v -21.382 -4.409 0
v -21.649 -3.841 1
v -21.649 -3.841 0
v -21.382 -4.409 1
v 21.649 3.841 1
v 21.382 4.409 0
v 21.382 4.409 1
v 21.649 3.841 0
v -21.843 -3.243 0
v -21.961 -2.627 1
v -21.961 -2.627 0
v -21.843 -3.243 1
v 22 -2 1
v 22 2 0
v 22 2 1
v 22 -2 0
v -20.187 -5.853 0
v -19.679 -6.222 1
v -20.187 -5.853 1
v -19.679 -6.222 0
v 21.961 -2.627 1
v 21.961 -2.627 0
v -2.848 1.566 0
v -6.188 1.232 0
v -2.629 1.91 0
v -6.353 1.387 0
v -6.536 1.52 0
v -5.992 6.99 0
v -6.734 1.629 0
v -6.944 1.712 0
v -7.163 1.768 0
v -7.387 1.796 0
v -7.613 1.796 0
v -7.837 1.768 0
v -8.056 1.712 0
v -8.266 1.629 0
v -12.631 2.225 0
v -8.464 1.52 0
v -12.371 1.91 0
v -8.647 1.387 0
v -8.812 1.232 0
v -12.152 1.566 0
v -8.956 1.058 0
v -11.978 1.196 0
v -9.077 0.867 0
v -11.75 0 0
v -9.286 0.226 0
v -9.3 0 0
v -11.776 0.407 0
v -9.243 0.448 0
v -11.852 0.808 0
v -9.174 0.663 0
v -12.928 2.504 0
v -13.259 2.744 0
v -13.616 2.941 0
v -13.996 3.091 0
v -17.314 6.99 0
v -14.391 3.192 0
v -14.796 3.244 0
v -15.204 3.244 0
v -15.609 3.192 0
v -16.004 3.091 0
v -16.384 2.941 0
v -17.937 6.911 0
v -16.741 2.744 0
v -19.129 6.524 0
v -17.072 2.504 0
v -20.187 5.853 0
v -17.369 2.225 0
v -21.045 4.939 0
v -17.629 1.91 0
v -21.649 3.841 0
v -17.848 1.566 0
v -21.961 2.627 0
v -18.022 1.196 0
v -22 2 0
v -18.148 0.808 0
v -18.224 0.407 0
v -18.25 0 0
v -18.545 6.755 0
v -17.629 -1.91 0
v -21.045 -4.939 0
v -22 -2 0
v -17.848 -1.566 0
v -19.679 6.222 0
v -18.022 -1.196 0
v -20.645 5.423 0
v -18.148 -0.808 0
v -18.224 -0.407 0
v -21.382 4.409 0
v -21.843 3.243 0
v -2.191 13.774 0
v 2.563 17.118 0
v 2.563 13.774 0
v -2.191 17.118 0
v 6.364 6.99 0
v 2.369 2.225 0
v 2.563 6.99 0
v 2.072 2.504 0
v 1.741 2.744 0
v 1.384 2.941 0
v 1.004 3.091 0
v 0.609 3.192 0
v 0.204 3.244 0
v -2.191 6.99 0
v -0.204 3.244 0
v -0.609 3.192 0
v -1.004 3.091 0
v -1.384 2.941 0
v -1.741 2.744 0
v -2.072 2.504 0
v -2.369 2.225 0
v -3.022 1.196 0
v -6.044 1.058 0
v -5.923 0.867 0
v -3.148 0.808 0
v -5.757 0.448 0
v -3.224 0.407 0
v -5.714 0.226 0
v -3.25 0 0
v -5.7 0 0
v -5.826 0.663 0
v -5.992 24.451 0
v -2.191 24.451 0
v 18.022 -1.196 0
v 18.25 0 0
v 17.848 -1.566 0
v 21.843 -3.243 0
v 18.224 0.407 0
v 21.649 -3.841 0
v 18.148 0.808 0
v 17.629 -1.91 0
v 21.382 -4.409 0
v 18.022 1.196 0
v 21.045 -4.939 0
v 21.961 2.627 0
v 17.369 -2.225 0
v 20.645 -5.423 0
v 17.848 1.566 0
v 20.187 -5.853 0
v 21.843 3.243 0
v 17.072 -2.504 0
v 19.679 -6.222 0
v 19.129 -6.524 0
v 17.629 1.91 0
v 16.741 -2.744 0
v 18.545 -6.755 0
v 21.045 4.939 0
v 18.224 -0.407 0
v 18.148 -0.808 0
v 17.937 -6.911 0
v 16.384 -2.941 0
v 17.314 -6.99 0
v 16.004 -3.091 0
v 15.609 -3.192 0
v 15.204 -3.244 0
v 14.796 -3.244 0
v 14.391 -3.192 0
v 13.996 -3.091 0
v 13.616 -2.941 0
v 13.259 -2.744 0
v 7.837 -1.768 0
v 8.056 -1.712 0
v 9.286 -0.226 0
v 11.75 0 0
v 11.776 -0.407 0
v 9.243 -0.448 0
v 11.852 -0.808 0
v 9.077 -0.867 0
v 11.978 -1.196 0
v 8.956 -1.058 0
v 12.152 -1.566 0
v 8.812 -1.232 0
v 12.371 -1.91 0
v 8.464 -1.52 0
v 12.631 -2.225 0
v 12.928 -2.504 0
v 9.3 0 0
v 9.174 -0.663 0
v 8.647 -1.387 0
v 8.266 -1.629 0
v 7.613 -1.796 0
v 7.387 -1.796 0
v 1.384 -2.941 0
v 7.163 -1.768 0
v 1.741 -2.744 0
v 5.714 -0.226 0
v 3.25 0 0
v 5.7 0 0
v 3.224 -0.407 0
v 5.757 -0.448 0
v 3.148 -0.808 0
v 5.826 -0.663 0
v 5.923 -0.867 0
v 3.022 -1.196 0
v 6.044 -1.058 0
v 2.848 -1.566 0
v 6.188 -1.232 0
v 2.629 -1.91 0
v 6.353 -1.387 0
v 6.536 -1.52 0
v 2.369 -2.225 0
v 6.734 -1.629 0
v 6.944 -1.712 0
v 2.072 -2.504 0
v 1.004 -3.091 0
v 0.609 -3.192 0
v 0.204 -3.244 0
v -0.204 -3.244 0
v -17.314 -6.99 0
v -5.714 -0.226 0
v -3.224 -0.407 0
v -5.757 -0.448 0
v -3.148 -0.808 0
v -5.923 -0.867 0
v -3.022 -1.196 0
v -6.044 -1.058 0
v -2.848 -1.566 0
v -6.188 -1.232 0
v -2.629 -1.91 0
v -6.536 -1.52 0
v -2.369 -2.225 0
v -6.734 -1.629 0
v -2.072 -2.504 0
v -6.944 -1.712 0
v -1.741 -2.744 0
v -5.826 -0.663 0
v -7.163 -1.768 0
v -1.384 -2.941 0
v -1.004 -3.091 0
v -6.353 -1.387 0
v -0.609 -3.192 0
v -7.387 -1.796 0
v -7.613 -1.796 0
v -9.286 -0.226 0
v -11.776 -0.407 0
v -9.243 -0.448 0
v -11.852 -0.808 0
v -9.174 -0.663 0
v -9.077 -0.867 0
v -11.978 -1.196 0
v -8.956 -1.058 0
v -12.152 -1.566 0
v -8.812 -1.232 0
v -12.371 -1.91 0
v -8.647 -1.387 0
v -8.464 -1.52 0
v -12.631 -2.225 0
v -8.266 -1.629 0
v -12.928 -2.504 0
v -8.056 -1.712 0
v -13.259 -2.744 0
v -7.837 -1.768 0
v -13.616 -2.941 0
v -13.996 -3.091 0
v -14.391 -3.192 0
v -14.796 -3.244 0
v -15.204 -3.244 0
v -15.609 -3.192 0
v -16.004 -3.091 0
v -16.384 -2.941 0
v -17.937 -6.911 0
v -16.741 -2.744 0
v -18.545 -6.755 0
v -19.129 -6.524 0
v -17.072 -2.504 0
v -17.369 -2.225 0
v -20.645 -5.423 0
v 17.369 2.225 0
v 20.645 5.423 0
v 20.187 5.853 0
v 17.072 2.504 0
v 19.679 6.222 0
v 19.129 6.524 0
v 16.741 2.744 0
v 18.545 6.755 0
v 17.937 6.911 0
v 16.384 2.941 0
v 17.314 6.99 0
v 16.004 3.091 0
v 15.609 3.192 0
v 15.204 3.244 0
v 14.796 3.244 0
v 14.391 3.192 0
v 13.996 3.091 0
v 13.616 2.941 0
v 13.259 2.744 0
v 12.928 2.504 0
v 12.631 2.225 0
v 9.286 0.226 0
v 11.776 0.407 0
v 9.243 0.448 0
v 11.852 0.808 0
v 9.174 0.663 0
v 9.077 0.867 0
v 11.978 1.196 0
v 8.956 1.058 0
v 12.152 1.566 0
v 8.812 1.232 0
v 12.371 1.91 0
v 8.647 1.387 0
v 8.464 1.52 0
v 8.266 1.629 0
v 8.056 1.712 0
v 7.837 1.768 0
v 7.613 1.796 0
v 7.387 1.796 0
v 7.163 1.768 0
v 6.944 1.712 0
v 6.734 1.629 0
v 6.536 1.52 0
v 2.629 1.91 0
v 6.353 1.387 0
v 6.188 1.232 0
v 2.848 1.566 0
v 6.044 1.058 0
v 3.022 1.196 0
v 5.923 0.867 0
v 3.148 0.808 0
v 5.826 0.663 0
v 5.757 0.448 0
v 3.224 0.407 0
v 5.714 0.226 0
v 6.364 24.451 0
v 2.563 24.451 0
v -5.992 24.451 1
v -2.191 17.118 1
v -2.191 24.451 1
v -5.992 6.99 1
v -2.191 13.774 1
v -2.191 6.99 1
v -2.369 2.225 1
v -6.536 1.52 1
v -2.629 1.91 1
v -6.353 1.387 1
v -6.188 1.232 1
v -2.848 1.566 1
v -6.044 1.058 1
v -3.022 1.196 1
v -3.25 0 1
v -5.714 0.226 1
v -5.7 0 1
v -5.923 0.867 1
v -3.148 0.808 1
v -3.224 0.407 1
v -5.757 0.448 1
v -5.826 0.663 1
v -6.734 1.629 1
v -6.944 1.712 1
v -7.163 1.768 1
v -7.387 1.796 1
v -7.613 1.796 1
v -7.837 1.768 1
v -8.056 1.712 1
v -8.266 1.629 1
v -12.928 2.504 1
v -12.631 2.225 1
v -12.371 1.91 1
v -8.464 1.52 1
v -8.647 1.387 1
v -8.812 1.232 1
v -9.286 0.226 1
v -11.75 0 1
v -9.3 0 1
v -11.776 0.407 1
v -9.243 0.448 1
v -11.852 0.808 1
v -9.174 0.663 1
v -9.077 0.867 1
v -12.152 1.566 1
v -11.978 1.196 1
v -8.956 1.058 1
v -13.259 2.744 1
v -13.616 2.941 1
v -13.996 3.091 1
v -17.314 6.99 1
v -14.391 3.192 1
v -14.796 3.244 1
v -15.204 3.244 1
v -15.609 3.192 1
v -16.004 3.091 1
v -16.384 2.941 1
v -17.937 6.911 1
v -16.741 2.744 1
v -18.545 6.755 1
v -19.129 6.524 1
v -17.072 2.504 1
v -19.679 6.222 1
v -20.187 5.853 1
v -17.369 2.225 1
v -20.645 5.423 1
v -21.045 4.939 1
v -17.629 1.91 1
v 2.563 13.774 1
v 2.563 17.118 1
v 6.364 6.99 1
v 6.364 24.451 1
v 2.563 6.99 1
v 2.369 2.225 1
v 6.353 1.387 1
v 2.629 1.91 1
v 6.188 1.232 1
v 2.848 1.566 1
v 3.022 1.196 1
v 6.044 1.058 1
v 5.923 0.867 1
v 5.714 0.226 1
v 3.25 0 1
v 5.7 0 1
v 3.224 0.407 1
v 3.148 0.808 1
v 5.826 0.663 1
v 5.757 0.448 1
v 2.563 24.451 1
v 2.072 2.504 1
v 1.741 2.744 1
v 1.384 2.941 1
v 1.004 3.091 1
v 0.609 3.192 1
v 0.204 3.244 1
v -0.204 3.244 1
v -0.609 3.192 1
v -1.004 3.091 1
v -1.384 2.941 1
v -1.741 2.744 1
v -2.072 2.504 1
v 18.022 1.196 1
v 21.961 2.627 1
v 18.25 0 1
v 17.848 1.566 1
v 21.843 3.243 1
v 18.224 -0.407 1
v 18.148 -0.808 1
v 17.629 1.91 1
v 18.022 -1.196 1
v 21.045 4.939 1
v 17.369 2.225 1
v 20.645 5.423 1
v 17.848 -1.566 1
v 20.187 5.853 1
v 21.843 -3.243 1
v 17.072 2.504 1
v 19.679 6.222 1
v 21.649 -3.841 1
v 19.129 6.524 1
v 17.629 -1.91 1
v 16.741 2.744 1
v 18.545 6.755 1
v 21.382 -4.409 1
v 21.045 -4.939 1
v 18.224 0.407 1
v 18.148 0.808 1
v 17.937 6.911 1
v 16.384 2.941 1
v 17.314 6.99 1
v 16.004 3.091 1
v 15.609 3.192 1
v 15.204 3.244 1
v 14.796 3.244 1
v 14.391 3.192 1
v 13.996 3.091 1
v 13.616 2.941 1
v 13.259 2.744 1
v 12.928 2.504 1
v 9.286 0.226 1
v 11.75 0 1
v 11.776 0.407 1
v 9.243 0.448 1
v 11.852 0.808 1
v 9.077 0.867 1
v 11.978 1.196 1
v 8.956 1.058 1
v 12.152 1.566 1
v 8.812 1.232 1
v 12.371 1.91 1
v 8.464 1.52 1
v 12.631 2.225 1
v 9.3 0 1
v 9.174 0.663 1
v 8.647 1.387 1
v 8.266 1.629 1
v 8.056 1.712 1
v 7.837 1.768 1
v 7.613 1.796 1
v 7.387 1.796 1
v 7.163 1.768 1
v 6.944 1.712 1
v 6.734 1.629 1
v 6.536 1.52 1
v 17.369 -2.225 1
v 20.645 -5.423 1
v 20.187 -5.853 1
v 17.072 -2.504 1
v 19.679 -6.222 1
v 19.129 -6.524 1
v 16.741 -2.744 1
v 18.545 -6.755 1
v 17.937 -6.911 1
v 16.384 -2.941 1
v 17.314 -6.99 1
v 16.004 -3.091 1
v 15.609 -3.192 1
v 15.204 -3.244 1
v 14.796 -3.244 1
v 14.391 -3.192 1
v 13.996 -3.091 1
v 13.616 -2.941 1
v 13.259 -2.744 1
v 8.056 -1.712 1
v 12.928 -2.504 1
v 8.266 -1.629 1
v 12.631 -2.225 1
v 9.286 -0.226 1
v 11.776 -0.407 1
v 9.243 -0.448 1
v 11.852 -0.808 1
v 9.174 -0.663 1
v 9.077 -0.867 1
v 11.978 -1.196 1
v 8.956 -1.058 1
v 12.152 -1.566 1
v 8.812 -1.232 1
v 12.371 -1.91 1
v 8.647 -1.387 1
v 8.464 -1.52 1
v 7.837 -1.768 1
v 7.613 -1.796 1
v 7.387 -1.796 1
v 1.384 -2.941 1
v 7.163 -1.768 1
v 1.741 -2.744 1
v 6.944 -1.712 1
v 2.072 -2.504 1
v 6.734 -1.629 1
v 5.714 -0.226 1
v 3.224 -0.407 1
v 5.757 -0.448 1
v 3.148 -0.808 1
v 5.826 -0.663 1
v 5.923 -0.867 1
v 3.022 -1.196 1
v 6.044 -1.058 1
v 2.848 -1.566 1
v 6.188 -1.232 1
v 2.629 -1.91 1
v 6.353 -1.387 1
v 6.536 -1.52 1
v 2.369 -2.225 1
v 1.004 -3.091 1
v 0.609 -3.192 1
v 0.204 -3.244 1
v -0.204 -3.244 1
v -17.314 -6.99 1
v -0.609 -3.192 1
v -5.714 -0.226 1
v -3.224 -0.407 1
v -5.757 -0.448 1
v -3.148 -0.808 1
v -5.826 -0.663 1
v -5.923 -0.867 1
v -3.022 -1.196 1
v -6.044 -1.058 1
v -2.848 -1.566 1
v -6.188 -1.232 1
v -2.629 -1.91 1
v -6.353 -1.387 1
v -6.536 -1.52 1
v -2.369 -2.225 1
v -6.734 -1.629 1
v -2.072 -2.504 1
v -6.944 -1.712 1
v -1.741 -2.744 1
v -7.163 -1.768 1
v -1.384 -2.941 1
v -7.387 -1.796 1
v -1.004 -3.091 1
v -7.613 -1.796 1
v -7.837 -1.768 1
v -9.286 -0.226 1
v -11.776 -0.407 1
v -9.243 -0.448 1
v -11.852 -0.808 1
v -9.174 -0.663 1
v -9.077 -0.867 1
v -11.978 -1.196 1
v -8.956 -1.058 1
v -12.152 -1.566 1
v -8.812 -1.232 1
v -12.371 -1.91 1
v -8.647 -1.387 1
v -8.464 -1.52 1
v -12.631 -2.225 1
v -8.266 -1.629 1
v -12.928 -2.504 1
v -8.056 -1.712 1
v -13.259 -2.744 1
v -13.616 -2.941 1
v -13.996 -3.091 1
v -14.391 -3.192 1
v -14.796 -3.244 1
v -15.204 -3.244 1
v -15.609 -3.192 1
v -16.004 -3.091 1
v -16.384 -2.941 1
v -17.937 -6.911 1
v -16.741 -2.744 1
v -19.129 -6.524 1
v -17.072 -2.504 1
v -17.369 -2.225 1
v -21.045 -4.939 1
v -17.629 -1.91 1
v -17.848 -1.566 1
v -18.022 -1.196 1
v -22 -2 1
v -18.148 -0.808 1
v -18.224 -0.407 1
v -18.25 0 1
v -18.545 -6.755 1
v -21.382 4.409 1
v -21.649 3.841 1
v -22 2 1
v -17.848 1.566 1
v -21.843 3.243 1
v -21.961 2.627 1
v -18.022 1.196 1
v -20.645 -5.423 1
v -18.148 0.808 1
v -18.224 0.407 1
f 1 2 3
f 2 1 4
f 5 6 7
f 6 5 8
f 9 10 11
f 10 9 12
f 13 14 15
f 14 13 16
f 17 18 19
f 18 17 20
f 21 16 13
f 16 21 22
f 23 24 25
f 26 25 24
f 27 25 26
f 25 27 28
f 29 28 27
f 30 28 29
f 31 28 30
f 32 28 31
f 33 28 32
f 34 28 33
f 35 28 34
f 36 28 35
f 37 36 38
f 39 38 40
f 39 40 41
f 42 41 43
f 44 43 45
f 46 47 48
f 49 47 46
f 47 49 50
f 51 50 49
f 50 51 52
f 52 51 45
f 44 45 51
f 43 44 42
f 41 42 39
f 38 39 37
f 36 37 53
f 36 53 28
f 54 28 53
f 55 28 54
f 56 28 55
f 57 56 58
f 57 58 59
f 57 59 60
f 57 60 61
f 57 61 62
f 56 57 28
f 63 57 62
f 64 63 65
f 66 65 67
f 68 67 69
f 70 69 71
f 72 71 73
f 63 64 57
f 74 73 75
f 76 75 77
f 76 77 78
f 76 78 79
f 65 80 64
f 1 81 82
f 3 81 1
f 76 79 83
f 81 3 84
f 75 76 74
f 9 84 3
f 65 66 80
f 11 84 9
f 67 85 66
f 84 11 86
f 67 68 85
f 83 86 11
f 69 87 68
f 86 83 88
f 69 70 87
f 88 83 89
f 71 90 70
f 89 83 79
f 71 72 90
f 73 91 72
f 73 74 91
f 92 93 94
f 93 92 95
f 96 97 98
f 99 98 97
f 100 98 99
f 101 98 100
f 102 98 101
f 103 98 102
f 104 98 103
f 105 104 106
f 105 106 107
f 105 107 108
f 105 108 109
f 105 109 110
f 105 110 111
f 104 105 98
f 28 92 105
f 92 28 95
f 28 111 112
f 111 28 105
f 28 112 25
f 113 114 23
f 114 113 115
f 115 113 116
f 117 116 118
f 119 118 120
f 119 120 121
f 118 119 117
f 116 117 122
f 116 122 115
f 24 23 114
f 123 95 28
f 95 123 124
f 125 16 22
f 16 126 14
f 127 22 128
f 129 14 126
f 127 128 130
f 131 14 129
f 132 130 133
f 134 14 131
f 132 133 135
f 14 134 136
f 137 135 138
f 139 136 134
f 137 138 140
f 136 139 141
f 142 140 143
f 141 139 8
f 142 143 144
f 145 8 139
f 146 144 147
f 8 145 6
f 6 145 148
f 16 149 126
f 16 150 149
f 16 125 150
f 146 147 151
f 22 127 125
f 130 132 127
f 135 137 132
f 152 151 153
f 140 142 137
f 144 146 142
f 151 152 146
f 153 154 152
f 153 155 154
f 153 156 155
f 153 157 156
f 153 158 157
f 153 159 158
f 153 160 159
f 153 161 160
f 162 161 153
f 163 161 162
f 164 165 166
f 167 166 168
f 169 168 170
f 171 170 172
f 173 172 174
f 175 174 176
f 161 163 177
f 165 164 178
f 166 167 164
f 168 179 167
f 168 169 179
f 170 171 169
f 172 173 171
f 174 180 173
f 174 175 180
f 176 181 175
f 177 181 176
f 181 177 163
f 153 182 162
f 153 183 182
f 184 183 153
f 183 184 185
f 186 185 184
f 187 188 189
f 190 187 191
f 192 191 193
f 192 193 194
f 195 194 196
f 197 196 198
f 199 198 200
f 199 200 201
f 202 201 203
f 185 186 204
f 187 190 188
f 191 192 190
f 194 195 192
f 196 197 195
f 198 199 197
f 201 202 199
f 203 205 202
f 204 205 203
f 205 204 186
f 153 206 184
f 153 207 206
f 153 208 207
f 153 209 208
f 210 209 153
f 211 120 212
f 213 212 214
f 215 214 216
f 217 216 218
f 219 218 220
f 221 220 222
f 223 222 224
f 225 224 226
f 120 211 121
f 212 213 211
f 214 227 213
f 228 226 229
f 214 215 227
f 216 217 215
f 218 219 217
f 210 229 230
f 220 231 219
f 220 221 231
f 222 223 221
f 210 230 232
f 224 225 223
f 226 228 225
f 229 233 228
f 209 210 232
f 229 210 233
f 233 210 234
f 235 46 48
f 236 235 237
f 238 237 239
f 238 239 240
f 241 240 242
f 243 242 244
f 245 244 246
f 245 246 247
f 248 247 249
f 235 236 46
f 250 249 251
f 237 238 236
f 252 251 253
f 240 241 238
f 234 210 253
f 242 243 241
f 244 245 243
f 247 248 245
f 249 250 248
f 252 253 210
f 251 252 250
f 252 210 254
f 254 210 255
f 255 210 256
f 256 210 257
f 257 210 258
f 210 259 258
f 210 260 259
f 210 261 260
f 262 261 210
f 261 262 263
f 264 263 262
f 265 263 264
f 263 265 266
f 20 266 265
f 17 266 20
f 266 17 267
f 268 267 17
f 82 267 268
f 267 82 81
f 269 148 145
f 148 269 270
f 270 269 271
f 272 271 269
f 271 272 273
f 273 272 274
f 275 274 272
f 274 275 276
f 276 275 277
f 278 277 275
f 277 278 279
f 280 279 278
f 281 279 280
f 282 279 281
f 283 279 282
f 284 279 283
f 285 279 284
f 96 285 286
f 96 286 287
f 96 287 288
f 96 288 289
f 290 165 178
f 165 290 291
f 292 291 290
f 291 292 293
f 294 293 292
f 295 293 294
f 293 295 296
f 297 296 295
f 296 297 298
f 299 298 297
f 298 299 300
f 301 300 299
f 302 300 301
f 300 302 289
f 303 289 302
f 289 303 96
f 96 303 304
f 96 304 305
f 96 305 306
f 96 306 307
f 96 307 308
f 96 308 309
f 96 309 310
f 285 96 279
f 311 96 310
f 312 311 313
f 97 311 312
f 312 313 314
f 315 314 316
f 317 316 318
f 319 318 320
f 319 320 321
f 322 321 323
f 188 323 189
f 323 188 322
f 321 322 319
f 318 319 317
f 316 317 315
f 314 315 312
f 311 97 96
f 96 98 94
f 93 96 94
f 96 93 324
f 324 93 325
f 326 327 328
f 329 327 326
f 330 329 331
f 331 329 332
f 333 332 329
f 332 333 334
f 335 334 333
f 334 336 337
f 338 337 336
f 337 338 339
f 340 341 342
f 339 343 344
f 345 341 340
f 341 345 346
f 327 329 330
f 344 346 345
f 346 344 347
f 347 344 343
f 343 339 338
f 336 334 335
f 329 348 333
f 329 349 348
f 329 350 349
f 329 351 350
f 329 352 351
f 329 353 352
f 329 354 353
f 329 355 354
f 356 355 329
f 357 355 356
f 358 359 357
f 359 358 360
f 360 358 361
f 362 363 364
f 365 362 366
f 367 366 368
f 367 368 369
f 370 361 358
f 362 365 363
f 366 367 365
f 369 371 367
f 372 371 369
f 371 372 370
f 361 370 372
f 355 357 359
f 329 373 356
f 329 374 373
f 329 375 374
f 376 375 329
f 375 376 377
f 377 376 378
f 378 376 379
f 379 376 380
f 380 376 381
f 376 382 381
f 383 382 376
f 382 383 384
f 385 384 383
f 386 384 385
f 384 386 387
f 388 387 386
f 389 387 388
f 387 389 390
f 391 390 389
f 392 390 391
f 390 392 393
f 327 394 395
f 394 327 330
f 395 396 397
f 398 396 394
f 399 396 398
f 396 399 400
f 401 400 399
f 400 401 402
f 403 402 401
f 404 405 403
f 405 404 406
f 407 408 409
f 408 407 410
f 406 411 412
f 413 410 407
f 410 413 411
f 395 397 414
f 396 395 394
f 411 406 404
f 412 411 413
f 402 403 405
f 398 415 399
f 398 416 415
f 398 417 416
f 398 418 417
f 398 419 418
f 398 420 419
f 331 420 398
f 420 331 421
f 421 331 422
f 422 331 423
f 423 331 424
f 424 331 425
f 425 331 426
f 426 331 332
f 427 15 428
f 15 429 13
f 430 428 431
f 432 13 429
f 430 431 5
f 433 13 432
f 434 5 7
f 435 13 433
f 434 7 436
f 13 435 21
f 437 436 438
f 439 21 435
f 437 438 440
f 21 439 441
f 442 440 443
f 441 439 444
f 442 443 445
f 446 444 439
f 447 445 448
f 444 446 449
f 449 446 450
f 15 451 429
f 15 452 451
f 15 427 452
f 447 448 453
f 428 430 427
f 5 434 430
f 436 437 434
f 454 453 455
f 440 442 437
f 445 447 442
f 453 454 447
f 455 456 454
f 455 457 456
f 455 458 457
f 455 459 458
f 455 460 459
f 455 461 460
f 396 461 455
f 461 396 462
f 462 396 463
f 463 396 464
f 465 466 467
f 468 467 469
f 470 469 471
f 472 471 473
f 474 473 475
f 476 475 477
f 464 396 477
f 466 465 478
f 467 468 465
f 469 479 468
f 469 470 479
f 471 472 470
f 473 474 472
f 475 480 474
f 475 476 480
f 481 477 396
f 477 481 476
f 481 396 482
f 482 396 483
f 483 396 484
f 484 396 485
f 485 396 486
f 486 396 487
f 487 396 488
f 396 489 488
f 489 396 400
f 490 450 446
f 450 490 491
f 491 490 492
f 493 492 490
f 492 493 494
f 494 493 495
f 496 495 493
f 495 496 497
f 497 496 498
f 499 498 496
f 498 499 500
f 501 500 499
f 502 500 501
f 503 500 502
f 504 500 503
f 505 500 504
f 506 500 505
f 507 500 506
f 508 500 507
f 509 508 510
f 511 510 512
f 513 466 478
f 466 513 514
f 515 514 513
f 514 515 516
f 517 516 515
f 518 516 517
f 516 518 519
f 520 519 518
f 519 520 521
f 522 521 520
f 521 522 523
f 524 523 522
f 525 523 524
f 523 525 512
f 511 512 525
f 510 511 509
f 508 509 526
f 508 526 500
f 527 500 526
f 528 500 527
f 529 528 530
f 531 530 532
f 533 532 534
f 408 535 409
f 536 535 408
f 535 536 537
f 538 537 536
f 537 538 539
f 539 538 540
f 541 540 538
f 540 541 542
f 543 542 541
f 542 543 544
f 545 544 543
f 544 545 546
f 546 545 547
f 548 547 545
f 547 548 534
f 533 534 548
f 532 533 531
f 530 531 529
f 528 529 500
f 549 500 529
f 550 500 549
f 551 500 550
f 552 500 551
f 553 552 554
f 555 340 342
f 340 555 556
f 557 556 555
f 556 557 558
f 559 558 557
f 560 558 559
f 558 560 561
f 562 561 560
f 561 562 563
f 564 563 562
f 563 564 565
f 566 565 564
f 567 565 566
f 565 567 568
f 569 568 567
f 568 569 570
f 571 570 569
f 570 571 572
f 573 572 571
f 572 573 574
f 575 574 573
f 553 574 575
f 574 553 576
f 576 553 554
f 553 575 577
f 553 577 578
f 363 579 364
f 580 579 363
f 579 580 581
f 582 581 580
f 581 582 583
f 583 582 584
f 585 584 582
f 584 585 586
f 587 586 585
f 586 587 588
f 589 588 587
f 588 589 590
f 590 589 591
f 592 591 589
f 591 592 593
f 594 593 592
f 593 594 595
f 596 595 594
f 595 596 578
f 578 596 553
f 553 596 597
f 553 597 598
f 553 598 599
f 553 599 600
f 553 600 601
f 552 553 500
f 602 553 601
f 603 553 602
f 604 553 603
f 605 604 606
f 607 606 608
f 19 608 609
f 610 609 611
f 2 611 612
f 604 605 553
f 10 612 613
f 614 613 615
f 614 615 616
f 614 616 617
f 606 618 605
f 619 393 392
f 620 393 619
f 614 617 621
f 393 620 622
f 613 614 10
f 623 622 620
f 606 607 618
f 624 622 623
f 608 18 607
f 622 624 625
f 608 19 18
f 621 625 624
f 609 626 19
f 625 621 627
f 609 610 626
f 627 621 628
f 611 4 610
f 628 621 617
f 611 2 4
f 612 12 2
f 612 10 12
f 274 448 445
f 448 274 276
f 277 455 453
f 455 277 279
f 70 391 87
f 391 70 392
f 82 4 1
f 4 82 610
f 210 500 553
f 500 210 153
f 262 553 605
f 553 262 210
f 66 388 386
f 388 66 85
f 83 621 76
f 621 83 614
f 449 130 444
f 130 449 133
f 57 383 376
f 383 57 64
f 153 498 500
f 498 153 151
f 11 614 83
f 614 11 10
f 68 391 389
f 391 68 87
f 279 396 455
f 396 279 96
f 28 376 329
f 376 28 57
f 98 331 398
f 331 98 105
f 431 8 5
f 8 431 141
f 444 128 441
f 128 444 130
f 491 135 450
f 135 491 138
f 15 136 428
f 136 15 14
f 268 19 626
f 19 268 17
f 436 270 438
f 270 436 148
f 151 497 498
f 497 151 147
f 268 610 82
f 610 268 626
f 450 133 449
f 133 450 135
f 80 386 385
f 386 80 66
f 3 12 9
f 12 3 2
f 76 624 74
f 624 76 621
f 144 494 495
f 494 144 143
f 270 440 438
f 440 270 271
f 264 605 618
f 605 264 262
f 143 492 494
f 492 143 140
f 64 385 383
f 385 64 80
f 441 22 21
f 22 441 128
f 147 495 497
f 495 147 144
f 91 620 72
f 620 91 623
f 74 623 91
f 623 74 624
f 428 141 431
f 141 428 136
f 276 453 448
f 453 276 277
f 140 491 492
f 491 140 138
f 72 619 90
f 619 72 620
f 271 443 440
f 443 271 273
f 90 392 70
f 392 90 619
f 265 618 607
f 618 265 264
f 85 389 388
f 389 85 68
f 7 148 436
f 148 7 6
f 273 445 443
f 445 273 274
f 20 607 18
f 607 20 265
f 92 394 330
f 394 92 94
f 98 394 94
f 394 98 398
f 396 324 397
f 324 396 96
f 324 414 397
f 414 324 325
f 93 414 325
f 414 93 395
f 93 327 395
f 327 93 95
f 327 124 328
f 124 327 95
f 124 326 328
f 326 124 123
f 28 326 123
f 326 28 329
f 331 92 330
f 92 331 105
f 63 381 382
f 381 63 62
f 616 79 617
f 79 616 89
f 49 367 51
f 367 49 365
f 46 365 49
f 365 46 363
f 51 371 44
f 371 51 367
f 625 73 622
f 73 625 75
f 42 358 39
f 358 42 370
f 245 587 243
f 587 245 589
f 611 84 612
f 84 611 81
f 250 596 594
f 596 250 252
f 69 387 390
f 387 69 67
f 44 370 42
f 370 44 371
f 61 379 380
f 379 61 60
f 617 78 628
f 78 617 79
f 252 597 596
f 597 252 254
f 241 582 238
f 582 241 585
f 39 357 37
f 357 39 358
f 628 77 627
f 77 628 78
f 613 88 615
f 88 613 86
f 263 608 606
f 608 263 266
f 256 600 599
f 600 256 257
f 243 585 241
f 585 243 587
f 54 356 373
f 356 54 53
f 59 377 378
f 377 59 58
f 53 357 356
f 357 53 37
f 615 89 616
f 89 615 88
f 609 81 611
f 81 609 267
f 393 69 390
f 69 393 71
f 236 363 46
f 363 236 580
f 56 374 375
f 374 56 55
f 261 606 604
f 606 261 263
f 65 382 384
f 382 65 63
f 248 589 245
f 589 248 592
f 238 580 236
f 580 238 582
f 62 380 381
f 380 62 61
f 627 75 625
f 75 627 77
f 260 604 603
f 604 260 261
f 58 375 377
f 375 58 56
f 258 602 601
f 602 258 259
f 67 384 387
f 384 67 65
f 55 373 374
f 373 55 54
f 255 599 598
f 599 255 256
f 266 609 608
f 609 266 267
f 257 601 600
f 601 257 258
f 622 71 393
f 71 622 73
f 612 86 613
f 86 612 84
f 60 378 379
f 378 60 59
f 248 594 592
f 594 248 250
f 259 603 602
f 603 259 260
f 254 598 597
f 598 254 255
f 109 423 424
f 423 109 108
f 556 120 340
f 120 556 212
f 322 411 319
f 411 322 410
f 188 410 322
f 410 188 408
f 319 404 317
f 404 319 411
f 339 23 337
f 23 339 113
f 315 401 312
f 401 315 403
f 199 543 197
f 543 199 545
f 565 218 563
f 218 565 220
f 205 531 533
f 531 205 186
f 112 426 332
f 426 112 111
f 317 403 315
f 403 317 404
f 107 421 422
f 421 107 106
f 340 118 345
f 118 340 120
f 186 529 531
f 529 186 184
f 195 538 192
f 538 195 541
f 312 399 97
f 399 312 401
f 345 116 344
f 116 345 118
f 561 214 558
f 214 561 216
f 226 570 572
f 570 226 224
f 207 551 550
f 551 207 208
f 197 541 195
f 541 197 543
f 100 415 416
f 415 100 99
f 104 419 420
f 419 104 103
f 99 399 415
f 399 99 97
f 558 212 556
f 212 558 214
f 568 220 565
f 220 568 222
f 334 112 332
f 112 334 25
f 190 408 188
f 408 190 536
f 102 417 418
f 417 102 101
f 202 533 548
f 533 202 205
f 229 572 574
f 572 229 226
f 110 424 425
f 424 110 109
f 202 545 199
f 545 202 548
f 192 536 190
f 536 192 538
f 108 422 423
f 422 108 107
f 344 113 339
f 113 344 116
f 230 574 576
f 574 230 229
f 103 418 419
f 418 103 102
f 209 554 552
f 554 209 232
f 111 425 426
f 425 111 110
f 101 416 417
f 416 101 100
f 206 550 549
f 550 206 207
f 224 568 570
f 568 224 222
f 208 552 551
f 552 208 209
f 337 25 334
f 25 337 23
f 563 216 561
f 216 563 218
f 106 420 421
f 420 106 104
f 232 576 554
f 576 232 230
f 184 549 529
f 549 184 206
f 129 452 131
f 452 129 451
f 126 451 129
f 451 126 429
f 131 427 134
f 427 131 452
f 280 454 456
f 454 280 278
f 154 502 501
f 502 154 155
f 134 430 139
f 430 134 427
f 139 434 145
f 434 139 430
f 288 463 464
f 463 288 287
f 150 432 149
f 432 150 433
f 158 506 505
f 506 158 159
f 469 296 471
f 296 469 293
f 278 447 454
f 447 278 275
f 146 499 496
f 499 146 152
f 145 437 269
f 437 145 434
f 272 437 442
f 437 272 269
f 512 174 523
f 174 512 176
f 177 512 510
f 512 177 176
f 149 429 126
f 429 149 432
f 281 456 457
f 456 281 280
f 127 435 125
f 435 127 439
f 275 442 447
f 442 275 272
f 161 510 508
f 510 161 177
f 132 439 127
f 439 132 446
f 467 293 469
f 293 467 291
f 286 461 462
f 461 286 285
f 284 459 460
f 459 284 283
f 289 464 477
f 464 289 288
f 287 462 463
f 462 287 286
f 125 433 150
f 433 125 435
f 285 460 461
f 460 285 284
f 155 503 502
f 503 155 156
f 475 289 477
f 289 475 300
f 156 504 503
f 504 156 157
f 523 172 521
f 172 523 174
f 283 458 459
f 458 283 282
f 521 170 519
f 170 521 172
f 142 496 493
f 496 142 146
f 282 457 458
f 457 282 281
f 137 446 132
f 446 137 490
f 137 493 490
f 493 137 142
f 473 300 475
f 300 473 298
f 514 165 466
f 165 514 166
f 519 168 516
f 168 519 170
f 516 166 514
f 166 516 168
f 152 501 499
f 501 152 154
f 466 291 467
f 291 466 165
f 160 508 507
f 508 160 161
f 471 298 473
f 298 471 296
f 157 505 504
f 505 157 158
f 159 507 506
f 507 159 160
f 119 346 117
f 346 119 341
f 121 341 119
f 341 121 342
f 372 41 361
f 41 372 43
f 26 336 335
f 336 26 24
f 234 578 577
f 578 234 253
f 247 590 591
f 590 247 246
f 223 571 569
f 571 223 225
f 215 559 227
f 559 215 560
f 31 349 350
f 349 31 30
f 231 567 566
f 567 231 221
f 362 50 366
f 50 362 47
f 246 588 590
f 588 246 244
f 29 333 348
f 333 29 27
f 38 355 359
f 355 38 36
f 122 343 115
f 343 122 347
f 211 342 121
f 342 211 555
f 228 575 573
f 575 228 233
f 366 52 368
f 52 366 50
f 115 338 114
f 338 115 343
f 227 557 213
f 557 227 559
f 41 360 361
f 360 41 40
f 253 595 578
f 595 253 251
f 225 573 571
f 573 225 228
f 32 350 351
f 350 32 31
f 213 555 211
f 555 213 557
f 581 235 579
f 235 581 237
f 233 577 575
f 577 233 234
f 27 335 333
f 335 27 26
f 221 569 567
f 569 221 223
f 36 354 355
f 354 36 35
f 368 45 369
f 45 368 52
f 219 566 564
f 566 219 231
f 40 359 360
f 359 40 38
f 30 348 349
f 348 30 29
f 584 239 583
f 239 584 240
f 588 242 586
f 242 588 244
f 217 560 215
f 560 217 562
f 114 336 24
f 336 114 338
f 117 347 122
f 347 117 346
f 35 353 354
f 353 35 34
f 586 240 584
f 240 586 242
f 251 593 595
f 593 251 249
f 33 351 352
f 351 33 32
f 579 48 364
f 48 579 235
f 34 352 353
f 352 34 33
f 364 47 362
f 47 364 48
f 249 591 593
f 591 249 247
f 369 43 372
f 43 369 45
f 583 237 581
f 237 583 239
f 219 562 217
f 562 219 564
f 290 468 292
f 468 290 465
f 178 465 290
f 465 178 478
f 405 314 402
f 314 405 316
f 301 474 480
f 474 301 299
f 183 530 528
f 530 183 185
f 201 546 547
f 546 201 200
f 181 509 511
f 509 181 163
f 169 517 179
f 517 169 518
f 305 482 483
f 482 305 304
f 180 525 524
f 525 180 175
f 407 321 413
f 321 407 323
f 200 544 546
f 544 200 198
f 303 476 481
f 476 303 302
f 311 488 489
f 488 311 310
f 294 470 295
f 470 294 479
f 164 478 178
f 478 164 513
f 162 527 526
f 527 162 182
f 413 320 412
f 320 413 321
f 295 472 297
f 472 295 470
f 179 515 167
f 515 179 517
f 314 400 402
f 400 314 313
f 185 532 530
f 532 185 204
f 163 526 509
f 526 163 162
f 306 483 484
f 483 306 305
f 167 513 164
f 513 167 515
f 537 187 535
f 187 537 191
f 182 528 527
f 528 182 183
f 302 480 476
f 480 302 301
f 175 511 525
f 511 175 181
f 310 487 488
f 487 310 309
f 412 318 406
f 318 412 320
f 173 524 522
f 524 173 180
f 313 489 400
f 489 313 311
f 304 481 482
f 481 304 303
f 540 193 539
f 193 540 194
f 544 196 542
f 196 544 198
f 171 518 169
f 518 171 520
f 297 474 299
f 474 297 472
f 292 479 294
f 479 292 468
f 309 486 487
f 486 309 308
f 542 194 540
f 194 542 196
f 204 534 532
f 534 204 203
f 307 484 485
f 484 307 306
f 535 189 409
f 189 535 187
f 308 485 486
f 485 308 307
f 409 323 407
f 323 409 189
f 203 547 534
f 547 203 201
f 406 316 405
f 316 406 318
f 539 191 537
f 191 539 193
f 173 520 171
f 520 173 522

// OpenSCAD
$fn = 50;


difference() {
	union() {
		hull() {
			translate(v = [-17.0000000000, 2.0000000000, 0]) {
				cylinder(h = 1, r = 5);
			}
			translate(v = [17.0000000000, 2.0000000000, 0]) {
				cylinder(h = 1, r = 5);
			}
			translate(v = [-17.0000000000, -2.0000000000, 0]) {
				cylinder(h = 1, r = 5);
			}
			translate(v = [17.0000000000, -2.0000000000, 0]) {
				cylinder(h = 1, r = 5);
			}
		}
		translate(v = [0, 24, 0]) {
			linear_extrude(height = 1) {
				text(font = "DejaVu Sans Mono:style=Bold", halign = "center", size = 19.0000000000, text = "H", valign = "top");
			}
		}
	}
	union() {
		translate(v = [-15.0000000000, 0.0000000000, 0]) {
			translate(v = [0, 0, -100]) {
				cylinder(h = 200, r = 3.2500000000);
			}
		}
		translate(v = [0, 0, -100]) {
			cylinder(h = 200, r = 3.2500000000);
		}
		translate(v = [15.0000000000, 0.0000000000, 0]) {
			translate(v = [0, 0, -100]) {
				cylinder(h = 200, r = 3.2500000000);
			}
		}
		translate(v = [-15.0000000000, 0.0000000000, 0]) {
			translate(v = [0, 0, -100]) {
				cylinder(h = 200, r = 1.8000000000);
			}
		}
		translate(v = [-7.5000000000, 0.0000000000, 0]) {
			translate(v = [0, 0, -100]) {
				cylinder(h = 200, r = 1.8000000000);
			}
		}
		translate(v = [0, 0, -100]) {
			cylinder(h = 200, r = 1.8000000000);
		}
		translate(v = [7.5000000000, 0.0000000000, 0]) {
			translate(v = [0, 0, -100]) {
				cylinder(h = 200, r = 1.8000000000);
			}
		}
		translate(v = [15.0000000000, 0.0000000000, 0]) {
			translate(v = [0, 0, -100]) {
				cylinder(h = 200, r = 1.8000000000);
			}
		}
	}
}
